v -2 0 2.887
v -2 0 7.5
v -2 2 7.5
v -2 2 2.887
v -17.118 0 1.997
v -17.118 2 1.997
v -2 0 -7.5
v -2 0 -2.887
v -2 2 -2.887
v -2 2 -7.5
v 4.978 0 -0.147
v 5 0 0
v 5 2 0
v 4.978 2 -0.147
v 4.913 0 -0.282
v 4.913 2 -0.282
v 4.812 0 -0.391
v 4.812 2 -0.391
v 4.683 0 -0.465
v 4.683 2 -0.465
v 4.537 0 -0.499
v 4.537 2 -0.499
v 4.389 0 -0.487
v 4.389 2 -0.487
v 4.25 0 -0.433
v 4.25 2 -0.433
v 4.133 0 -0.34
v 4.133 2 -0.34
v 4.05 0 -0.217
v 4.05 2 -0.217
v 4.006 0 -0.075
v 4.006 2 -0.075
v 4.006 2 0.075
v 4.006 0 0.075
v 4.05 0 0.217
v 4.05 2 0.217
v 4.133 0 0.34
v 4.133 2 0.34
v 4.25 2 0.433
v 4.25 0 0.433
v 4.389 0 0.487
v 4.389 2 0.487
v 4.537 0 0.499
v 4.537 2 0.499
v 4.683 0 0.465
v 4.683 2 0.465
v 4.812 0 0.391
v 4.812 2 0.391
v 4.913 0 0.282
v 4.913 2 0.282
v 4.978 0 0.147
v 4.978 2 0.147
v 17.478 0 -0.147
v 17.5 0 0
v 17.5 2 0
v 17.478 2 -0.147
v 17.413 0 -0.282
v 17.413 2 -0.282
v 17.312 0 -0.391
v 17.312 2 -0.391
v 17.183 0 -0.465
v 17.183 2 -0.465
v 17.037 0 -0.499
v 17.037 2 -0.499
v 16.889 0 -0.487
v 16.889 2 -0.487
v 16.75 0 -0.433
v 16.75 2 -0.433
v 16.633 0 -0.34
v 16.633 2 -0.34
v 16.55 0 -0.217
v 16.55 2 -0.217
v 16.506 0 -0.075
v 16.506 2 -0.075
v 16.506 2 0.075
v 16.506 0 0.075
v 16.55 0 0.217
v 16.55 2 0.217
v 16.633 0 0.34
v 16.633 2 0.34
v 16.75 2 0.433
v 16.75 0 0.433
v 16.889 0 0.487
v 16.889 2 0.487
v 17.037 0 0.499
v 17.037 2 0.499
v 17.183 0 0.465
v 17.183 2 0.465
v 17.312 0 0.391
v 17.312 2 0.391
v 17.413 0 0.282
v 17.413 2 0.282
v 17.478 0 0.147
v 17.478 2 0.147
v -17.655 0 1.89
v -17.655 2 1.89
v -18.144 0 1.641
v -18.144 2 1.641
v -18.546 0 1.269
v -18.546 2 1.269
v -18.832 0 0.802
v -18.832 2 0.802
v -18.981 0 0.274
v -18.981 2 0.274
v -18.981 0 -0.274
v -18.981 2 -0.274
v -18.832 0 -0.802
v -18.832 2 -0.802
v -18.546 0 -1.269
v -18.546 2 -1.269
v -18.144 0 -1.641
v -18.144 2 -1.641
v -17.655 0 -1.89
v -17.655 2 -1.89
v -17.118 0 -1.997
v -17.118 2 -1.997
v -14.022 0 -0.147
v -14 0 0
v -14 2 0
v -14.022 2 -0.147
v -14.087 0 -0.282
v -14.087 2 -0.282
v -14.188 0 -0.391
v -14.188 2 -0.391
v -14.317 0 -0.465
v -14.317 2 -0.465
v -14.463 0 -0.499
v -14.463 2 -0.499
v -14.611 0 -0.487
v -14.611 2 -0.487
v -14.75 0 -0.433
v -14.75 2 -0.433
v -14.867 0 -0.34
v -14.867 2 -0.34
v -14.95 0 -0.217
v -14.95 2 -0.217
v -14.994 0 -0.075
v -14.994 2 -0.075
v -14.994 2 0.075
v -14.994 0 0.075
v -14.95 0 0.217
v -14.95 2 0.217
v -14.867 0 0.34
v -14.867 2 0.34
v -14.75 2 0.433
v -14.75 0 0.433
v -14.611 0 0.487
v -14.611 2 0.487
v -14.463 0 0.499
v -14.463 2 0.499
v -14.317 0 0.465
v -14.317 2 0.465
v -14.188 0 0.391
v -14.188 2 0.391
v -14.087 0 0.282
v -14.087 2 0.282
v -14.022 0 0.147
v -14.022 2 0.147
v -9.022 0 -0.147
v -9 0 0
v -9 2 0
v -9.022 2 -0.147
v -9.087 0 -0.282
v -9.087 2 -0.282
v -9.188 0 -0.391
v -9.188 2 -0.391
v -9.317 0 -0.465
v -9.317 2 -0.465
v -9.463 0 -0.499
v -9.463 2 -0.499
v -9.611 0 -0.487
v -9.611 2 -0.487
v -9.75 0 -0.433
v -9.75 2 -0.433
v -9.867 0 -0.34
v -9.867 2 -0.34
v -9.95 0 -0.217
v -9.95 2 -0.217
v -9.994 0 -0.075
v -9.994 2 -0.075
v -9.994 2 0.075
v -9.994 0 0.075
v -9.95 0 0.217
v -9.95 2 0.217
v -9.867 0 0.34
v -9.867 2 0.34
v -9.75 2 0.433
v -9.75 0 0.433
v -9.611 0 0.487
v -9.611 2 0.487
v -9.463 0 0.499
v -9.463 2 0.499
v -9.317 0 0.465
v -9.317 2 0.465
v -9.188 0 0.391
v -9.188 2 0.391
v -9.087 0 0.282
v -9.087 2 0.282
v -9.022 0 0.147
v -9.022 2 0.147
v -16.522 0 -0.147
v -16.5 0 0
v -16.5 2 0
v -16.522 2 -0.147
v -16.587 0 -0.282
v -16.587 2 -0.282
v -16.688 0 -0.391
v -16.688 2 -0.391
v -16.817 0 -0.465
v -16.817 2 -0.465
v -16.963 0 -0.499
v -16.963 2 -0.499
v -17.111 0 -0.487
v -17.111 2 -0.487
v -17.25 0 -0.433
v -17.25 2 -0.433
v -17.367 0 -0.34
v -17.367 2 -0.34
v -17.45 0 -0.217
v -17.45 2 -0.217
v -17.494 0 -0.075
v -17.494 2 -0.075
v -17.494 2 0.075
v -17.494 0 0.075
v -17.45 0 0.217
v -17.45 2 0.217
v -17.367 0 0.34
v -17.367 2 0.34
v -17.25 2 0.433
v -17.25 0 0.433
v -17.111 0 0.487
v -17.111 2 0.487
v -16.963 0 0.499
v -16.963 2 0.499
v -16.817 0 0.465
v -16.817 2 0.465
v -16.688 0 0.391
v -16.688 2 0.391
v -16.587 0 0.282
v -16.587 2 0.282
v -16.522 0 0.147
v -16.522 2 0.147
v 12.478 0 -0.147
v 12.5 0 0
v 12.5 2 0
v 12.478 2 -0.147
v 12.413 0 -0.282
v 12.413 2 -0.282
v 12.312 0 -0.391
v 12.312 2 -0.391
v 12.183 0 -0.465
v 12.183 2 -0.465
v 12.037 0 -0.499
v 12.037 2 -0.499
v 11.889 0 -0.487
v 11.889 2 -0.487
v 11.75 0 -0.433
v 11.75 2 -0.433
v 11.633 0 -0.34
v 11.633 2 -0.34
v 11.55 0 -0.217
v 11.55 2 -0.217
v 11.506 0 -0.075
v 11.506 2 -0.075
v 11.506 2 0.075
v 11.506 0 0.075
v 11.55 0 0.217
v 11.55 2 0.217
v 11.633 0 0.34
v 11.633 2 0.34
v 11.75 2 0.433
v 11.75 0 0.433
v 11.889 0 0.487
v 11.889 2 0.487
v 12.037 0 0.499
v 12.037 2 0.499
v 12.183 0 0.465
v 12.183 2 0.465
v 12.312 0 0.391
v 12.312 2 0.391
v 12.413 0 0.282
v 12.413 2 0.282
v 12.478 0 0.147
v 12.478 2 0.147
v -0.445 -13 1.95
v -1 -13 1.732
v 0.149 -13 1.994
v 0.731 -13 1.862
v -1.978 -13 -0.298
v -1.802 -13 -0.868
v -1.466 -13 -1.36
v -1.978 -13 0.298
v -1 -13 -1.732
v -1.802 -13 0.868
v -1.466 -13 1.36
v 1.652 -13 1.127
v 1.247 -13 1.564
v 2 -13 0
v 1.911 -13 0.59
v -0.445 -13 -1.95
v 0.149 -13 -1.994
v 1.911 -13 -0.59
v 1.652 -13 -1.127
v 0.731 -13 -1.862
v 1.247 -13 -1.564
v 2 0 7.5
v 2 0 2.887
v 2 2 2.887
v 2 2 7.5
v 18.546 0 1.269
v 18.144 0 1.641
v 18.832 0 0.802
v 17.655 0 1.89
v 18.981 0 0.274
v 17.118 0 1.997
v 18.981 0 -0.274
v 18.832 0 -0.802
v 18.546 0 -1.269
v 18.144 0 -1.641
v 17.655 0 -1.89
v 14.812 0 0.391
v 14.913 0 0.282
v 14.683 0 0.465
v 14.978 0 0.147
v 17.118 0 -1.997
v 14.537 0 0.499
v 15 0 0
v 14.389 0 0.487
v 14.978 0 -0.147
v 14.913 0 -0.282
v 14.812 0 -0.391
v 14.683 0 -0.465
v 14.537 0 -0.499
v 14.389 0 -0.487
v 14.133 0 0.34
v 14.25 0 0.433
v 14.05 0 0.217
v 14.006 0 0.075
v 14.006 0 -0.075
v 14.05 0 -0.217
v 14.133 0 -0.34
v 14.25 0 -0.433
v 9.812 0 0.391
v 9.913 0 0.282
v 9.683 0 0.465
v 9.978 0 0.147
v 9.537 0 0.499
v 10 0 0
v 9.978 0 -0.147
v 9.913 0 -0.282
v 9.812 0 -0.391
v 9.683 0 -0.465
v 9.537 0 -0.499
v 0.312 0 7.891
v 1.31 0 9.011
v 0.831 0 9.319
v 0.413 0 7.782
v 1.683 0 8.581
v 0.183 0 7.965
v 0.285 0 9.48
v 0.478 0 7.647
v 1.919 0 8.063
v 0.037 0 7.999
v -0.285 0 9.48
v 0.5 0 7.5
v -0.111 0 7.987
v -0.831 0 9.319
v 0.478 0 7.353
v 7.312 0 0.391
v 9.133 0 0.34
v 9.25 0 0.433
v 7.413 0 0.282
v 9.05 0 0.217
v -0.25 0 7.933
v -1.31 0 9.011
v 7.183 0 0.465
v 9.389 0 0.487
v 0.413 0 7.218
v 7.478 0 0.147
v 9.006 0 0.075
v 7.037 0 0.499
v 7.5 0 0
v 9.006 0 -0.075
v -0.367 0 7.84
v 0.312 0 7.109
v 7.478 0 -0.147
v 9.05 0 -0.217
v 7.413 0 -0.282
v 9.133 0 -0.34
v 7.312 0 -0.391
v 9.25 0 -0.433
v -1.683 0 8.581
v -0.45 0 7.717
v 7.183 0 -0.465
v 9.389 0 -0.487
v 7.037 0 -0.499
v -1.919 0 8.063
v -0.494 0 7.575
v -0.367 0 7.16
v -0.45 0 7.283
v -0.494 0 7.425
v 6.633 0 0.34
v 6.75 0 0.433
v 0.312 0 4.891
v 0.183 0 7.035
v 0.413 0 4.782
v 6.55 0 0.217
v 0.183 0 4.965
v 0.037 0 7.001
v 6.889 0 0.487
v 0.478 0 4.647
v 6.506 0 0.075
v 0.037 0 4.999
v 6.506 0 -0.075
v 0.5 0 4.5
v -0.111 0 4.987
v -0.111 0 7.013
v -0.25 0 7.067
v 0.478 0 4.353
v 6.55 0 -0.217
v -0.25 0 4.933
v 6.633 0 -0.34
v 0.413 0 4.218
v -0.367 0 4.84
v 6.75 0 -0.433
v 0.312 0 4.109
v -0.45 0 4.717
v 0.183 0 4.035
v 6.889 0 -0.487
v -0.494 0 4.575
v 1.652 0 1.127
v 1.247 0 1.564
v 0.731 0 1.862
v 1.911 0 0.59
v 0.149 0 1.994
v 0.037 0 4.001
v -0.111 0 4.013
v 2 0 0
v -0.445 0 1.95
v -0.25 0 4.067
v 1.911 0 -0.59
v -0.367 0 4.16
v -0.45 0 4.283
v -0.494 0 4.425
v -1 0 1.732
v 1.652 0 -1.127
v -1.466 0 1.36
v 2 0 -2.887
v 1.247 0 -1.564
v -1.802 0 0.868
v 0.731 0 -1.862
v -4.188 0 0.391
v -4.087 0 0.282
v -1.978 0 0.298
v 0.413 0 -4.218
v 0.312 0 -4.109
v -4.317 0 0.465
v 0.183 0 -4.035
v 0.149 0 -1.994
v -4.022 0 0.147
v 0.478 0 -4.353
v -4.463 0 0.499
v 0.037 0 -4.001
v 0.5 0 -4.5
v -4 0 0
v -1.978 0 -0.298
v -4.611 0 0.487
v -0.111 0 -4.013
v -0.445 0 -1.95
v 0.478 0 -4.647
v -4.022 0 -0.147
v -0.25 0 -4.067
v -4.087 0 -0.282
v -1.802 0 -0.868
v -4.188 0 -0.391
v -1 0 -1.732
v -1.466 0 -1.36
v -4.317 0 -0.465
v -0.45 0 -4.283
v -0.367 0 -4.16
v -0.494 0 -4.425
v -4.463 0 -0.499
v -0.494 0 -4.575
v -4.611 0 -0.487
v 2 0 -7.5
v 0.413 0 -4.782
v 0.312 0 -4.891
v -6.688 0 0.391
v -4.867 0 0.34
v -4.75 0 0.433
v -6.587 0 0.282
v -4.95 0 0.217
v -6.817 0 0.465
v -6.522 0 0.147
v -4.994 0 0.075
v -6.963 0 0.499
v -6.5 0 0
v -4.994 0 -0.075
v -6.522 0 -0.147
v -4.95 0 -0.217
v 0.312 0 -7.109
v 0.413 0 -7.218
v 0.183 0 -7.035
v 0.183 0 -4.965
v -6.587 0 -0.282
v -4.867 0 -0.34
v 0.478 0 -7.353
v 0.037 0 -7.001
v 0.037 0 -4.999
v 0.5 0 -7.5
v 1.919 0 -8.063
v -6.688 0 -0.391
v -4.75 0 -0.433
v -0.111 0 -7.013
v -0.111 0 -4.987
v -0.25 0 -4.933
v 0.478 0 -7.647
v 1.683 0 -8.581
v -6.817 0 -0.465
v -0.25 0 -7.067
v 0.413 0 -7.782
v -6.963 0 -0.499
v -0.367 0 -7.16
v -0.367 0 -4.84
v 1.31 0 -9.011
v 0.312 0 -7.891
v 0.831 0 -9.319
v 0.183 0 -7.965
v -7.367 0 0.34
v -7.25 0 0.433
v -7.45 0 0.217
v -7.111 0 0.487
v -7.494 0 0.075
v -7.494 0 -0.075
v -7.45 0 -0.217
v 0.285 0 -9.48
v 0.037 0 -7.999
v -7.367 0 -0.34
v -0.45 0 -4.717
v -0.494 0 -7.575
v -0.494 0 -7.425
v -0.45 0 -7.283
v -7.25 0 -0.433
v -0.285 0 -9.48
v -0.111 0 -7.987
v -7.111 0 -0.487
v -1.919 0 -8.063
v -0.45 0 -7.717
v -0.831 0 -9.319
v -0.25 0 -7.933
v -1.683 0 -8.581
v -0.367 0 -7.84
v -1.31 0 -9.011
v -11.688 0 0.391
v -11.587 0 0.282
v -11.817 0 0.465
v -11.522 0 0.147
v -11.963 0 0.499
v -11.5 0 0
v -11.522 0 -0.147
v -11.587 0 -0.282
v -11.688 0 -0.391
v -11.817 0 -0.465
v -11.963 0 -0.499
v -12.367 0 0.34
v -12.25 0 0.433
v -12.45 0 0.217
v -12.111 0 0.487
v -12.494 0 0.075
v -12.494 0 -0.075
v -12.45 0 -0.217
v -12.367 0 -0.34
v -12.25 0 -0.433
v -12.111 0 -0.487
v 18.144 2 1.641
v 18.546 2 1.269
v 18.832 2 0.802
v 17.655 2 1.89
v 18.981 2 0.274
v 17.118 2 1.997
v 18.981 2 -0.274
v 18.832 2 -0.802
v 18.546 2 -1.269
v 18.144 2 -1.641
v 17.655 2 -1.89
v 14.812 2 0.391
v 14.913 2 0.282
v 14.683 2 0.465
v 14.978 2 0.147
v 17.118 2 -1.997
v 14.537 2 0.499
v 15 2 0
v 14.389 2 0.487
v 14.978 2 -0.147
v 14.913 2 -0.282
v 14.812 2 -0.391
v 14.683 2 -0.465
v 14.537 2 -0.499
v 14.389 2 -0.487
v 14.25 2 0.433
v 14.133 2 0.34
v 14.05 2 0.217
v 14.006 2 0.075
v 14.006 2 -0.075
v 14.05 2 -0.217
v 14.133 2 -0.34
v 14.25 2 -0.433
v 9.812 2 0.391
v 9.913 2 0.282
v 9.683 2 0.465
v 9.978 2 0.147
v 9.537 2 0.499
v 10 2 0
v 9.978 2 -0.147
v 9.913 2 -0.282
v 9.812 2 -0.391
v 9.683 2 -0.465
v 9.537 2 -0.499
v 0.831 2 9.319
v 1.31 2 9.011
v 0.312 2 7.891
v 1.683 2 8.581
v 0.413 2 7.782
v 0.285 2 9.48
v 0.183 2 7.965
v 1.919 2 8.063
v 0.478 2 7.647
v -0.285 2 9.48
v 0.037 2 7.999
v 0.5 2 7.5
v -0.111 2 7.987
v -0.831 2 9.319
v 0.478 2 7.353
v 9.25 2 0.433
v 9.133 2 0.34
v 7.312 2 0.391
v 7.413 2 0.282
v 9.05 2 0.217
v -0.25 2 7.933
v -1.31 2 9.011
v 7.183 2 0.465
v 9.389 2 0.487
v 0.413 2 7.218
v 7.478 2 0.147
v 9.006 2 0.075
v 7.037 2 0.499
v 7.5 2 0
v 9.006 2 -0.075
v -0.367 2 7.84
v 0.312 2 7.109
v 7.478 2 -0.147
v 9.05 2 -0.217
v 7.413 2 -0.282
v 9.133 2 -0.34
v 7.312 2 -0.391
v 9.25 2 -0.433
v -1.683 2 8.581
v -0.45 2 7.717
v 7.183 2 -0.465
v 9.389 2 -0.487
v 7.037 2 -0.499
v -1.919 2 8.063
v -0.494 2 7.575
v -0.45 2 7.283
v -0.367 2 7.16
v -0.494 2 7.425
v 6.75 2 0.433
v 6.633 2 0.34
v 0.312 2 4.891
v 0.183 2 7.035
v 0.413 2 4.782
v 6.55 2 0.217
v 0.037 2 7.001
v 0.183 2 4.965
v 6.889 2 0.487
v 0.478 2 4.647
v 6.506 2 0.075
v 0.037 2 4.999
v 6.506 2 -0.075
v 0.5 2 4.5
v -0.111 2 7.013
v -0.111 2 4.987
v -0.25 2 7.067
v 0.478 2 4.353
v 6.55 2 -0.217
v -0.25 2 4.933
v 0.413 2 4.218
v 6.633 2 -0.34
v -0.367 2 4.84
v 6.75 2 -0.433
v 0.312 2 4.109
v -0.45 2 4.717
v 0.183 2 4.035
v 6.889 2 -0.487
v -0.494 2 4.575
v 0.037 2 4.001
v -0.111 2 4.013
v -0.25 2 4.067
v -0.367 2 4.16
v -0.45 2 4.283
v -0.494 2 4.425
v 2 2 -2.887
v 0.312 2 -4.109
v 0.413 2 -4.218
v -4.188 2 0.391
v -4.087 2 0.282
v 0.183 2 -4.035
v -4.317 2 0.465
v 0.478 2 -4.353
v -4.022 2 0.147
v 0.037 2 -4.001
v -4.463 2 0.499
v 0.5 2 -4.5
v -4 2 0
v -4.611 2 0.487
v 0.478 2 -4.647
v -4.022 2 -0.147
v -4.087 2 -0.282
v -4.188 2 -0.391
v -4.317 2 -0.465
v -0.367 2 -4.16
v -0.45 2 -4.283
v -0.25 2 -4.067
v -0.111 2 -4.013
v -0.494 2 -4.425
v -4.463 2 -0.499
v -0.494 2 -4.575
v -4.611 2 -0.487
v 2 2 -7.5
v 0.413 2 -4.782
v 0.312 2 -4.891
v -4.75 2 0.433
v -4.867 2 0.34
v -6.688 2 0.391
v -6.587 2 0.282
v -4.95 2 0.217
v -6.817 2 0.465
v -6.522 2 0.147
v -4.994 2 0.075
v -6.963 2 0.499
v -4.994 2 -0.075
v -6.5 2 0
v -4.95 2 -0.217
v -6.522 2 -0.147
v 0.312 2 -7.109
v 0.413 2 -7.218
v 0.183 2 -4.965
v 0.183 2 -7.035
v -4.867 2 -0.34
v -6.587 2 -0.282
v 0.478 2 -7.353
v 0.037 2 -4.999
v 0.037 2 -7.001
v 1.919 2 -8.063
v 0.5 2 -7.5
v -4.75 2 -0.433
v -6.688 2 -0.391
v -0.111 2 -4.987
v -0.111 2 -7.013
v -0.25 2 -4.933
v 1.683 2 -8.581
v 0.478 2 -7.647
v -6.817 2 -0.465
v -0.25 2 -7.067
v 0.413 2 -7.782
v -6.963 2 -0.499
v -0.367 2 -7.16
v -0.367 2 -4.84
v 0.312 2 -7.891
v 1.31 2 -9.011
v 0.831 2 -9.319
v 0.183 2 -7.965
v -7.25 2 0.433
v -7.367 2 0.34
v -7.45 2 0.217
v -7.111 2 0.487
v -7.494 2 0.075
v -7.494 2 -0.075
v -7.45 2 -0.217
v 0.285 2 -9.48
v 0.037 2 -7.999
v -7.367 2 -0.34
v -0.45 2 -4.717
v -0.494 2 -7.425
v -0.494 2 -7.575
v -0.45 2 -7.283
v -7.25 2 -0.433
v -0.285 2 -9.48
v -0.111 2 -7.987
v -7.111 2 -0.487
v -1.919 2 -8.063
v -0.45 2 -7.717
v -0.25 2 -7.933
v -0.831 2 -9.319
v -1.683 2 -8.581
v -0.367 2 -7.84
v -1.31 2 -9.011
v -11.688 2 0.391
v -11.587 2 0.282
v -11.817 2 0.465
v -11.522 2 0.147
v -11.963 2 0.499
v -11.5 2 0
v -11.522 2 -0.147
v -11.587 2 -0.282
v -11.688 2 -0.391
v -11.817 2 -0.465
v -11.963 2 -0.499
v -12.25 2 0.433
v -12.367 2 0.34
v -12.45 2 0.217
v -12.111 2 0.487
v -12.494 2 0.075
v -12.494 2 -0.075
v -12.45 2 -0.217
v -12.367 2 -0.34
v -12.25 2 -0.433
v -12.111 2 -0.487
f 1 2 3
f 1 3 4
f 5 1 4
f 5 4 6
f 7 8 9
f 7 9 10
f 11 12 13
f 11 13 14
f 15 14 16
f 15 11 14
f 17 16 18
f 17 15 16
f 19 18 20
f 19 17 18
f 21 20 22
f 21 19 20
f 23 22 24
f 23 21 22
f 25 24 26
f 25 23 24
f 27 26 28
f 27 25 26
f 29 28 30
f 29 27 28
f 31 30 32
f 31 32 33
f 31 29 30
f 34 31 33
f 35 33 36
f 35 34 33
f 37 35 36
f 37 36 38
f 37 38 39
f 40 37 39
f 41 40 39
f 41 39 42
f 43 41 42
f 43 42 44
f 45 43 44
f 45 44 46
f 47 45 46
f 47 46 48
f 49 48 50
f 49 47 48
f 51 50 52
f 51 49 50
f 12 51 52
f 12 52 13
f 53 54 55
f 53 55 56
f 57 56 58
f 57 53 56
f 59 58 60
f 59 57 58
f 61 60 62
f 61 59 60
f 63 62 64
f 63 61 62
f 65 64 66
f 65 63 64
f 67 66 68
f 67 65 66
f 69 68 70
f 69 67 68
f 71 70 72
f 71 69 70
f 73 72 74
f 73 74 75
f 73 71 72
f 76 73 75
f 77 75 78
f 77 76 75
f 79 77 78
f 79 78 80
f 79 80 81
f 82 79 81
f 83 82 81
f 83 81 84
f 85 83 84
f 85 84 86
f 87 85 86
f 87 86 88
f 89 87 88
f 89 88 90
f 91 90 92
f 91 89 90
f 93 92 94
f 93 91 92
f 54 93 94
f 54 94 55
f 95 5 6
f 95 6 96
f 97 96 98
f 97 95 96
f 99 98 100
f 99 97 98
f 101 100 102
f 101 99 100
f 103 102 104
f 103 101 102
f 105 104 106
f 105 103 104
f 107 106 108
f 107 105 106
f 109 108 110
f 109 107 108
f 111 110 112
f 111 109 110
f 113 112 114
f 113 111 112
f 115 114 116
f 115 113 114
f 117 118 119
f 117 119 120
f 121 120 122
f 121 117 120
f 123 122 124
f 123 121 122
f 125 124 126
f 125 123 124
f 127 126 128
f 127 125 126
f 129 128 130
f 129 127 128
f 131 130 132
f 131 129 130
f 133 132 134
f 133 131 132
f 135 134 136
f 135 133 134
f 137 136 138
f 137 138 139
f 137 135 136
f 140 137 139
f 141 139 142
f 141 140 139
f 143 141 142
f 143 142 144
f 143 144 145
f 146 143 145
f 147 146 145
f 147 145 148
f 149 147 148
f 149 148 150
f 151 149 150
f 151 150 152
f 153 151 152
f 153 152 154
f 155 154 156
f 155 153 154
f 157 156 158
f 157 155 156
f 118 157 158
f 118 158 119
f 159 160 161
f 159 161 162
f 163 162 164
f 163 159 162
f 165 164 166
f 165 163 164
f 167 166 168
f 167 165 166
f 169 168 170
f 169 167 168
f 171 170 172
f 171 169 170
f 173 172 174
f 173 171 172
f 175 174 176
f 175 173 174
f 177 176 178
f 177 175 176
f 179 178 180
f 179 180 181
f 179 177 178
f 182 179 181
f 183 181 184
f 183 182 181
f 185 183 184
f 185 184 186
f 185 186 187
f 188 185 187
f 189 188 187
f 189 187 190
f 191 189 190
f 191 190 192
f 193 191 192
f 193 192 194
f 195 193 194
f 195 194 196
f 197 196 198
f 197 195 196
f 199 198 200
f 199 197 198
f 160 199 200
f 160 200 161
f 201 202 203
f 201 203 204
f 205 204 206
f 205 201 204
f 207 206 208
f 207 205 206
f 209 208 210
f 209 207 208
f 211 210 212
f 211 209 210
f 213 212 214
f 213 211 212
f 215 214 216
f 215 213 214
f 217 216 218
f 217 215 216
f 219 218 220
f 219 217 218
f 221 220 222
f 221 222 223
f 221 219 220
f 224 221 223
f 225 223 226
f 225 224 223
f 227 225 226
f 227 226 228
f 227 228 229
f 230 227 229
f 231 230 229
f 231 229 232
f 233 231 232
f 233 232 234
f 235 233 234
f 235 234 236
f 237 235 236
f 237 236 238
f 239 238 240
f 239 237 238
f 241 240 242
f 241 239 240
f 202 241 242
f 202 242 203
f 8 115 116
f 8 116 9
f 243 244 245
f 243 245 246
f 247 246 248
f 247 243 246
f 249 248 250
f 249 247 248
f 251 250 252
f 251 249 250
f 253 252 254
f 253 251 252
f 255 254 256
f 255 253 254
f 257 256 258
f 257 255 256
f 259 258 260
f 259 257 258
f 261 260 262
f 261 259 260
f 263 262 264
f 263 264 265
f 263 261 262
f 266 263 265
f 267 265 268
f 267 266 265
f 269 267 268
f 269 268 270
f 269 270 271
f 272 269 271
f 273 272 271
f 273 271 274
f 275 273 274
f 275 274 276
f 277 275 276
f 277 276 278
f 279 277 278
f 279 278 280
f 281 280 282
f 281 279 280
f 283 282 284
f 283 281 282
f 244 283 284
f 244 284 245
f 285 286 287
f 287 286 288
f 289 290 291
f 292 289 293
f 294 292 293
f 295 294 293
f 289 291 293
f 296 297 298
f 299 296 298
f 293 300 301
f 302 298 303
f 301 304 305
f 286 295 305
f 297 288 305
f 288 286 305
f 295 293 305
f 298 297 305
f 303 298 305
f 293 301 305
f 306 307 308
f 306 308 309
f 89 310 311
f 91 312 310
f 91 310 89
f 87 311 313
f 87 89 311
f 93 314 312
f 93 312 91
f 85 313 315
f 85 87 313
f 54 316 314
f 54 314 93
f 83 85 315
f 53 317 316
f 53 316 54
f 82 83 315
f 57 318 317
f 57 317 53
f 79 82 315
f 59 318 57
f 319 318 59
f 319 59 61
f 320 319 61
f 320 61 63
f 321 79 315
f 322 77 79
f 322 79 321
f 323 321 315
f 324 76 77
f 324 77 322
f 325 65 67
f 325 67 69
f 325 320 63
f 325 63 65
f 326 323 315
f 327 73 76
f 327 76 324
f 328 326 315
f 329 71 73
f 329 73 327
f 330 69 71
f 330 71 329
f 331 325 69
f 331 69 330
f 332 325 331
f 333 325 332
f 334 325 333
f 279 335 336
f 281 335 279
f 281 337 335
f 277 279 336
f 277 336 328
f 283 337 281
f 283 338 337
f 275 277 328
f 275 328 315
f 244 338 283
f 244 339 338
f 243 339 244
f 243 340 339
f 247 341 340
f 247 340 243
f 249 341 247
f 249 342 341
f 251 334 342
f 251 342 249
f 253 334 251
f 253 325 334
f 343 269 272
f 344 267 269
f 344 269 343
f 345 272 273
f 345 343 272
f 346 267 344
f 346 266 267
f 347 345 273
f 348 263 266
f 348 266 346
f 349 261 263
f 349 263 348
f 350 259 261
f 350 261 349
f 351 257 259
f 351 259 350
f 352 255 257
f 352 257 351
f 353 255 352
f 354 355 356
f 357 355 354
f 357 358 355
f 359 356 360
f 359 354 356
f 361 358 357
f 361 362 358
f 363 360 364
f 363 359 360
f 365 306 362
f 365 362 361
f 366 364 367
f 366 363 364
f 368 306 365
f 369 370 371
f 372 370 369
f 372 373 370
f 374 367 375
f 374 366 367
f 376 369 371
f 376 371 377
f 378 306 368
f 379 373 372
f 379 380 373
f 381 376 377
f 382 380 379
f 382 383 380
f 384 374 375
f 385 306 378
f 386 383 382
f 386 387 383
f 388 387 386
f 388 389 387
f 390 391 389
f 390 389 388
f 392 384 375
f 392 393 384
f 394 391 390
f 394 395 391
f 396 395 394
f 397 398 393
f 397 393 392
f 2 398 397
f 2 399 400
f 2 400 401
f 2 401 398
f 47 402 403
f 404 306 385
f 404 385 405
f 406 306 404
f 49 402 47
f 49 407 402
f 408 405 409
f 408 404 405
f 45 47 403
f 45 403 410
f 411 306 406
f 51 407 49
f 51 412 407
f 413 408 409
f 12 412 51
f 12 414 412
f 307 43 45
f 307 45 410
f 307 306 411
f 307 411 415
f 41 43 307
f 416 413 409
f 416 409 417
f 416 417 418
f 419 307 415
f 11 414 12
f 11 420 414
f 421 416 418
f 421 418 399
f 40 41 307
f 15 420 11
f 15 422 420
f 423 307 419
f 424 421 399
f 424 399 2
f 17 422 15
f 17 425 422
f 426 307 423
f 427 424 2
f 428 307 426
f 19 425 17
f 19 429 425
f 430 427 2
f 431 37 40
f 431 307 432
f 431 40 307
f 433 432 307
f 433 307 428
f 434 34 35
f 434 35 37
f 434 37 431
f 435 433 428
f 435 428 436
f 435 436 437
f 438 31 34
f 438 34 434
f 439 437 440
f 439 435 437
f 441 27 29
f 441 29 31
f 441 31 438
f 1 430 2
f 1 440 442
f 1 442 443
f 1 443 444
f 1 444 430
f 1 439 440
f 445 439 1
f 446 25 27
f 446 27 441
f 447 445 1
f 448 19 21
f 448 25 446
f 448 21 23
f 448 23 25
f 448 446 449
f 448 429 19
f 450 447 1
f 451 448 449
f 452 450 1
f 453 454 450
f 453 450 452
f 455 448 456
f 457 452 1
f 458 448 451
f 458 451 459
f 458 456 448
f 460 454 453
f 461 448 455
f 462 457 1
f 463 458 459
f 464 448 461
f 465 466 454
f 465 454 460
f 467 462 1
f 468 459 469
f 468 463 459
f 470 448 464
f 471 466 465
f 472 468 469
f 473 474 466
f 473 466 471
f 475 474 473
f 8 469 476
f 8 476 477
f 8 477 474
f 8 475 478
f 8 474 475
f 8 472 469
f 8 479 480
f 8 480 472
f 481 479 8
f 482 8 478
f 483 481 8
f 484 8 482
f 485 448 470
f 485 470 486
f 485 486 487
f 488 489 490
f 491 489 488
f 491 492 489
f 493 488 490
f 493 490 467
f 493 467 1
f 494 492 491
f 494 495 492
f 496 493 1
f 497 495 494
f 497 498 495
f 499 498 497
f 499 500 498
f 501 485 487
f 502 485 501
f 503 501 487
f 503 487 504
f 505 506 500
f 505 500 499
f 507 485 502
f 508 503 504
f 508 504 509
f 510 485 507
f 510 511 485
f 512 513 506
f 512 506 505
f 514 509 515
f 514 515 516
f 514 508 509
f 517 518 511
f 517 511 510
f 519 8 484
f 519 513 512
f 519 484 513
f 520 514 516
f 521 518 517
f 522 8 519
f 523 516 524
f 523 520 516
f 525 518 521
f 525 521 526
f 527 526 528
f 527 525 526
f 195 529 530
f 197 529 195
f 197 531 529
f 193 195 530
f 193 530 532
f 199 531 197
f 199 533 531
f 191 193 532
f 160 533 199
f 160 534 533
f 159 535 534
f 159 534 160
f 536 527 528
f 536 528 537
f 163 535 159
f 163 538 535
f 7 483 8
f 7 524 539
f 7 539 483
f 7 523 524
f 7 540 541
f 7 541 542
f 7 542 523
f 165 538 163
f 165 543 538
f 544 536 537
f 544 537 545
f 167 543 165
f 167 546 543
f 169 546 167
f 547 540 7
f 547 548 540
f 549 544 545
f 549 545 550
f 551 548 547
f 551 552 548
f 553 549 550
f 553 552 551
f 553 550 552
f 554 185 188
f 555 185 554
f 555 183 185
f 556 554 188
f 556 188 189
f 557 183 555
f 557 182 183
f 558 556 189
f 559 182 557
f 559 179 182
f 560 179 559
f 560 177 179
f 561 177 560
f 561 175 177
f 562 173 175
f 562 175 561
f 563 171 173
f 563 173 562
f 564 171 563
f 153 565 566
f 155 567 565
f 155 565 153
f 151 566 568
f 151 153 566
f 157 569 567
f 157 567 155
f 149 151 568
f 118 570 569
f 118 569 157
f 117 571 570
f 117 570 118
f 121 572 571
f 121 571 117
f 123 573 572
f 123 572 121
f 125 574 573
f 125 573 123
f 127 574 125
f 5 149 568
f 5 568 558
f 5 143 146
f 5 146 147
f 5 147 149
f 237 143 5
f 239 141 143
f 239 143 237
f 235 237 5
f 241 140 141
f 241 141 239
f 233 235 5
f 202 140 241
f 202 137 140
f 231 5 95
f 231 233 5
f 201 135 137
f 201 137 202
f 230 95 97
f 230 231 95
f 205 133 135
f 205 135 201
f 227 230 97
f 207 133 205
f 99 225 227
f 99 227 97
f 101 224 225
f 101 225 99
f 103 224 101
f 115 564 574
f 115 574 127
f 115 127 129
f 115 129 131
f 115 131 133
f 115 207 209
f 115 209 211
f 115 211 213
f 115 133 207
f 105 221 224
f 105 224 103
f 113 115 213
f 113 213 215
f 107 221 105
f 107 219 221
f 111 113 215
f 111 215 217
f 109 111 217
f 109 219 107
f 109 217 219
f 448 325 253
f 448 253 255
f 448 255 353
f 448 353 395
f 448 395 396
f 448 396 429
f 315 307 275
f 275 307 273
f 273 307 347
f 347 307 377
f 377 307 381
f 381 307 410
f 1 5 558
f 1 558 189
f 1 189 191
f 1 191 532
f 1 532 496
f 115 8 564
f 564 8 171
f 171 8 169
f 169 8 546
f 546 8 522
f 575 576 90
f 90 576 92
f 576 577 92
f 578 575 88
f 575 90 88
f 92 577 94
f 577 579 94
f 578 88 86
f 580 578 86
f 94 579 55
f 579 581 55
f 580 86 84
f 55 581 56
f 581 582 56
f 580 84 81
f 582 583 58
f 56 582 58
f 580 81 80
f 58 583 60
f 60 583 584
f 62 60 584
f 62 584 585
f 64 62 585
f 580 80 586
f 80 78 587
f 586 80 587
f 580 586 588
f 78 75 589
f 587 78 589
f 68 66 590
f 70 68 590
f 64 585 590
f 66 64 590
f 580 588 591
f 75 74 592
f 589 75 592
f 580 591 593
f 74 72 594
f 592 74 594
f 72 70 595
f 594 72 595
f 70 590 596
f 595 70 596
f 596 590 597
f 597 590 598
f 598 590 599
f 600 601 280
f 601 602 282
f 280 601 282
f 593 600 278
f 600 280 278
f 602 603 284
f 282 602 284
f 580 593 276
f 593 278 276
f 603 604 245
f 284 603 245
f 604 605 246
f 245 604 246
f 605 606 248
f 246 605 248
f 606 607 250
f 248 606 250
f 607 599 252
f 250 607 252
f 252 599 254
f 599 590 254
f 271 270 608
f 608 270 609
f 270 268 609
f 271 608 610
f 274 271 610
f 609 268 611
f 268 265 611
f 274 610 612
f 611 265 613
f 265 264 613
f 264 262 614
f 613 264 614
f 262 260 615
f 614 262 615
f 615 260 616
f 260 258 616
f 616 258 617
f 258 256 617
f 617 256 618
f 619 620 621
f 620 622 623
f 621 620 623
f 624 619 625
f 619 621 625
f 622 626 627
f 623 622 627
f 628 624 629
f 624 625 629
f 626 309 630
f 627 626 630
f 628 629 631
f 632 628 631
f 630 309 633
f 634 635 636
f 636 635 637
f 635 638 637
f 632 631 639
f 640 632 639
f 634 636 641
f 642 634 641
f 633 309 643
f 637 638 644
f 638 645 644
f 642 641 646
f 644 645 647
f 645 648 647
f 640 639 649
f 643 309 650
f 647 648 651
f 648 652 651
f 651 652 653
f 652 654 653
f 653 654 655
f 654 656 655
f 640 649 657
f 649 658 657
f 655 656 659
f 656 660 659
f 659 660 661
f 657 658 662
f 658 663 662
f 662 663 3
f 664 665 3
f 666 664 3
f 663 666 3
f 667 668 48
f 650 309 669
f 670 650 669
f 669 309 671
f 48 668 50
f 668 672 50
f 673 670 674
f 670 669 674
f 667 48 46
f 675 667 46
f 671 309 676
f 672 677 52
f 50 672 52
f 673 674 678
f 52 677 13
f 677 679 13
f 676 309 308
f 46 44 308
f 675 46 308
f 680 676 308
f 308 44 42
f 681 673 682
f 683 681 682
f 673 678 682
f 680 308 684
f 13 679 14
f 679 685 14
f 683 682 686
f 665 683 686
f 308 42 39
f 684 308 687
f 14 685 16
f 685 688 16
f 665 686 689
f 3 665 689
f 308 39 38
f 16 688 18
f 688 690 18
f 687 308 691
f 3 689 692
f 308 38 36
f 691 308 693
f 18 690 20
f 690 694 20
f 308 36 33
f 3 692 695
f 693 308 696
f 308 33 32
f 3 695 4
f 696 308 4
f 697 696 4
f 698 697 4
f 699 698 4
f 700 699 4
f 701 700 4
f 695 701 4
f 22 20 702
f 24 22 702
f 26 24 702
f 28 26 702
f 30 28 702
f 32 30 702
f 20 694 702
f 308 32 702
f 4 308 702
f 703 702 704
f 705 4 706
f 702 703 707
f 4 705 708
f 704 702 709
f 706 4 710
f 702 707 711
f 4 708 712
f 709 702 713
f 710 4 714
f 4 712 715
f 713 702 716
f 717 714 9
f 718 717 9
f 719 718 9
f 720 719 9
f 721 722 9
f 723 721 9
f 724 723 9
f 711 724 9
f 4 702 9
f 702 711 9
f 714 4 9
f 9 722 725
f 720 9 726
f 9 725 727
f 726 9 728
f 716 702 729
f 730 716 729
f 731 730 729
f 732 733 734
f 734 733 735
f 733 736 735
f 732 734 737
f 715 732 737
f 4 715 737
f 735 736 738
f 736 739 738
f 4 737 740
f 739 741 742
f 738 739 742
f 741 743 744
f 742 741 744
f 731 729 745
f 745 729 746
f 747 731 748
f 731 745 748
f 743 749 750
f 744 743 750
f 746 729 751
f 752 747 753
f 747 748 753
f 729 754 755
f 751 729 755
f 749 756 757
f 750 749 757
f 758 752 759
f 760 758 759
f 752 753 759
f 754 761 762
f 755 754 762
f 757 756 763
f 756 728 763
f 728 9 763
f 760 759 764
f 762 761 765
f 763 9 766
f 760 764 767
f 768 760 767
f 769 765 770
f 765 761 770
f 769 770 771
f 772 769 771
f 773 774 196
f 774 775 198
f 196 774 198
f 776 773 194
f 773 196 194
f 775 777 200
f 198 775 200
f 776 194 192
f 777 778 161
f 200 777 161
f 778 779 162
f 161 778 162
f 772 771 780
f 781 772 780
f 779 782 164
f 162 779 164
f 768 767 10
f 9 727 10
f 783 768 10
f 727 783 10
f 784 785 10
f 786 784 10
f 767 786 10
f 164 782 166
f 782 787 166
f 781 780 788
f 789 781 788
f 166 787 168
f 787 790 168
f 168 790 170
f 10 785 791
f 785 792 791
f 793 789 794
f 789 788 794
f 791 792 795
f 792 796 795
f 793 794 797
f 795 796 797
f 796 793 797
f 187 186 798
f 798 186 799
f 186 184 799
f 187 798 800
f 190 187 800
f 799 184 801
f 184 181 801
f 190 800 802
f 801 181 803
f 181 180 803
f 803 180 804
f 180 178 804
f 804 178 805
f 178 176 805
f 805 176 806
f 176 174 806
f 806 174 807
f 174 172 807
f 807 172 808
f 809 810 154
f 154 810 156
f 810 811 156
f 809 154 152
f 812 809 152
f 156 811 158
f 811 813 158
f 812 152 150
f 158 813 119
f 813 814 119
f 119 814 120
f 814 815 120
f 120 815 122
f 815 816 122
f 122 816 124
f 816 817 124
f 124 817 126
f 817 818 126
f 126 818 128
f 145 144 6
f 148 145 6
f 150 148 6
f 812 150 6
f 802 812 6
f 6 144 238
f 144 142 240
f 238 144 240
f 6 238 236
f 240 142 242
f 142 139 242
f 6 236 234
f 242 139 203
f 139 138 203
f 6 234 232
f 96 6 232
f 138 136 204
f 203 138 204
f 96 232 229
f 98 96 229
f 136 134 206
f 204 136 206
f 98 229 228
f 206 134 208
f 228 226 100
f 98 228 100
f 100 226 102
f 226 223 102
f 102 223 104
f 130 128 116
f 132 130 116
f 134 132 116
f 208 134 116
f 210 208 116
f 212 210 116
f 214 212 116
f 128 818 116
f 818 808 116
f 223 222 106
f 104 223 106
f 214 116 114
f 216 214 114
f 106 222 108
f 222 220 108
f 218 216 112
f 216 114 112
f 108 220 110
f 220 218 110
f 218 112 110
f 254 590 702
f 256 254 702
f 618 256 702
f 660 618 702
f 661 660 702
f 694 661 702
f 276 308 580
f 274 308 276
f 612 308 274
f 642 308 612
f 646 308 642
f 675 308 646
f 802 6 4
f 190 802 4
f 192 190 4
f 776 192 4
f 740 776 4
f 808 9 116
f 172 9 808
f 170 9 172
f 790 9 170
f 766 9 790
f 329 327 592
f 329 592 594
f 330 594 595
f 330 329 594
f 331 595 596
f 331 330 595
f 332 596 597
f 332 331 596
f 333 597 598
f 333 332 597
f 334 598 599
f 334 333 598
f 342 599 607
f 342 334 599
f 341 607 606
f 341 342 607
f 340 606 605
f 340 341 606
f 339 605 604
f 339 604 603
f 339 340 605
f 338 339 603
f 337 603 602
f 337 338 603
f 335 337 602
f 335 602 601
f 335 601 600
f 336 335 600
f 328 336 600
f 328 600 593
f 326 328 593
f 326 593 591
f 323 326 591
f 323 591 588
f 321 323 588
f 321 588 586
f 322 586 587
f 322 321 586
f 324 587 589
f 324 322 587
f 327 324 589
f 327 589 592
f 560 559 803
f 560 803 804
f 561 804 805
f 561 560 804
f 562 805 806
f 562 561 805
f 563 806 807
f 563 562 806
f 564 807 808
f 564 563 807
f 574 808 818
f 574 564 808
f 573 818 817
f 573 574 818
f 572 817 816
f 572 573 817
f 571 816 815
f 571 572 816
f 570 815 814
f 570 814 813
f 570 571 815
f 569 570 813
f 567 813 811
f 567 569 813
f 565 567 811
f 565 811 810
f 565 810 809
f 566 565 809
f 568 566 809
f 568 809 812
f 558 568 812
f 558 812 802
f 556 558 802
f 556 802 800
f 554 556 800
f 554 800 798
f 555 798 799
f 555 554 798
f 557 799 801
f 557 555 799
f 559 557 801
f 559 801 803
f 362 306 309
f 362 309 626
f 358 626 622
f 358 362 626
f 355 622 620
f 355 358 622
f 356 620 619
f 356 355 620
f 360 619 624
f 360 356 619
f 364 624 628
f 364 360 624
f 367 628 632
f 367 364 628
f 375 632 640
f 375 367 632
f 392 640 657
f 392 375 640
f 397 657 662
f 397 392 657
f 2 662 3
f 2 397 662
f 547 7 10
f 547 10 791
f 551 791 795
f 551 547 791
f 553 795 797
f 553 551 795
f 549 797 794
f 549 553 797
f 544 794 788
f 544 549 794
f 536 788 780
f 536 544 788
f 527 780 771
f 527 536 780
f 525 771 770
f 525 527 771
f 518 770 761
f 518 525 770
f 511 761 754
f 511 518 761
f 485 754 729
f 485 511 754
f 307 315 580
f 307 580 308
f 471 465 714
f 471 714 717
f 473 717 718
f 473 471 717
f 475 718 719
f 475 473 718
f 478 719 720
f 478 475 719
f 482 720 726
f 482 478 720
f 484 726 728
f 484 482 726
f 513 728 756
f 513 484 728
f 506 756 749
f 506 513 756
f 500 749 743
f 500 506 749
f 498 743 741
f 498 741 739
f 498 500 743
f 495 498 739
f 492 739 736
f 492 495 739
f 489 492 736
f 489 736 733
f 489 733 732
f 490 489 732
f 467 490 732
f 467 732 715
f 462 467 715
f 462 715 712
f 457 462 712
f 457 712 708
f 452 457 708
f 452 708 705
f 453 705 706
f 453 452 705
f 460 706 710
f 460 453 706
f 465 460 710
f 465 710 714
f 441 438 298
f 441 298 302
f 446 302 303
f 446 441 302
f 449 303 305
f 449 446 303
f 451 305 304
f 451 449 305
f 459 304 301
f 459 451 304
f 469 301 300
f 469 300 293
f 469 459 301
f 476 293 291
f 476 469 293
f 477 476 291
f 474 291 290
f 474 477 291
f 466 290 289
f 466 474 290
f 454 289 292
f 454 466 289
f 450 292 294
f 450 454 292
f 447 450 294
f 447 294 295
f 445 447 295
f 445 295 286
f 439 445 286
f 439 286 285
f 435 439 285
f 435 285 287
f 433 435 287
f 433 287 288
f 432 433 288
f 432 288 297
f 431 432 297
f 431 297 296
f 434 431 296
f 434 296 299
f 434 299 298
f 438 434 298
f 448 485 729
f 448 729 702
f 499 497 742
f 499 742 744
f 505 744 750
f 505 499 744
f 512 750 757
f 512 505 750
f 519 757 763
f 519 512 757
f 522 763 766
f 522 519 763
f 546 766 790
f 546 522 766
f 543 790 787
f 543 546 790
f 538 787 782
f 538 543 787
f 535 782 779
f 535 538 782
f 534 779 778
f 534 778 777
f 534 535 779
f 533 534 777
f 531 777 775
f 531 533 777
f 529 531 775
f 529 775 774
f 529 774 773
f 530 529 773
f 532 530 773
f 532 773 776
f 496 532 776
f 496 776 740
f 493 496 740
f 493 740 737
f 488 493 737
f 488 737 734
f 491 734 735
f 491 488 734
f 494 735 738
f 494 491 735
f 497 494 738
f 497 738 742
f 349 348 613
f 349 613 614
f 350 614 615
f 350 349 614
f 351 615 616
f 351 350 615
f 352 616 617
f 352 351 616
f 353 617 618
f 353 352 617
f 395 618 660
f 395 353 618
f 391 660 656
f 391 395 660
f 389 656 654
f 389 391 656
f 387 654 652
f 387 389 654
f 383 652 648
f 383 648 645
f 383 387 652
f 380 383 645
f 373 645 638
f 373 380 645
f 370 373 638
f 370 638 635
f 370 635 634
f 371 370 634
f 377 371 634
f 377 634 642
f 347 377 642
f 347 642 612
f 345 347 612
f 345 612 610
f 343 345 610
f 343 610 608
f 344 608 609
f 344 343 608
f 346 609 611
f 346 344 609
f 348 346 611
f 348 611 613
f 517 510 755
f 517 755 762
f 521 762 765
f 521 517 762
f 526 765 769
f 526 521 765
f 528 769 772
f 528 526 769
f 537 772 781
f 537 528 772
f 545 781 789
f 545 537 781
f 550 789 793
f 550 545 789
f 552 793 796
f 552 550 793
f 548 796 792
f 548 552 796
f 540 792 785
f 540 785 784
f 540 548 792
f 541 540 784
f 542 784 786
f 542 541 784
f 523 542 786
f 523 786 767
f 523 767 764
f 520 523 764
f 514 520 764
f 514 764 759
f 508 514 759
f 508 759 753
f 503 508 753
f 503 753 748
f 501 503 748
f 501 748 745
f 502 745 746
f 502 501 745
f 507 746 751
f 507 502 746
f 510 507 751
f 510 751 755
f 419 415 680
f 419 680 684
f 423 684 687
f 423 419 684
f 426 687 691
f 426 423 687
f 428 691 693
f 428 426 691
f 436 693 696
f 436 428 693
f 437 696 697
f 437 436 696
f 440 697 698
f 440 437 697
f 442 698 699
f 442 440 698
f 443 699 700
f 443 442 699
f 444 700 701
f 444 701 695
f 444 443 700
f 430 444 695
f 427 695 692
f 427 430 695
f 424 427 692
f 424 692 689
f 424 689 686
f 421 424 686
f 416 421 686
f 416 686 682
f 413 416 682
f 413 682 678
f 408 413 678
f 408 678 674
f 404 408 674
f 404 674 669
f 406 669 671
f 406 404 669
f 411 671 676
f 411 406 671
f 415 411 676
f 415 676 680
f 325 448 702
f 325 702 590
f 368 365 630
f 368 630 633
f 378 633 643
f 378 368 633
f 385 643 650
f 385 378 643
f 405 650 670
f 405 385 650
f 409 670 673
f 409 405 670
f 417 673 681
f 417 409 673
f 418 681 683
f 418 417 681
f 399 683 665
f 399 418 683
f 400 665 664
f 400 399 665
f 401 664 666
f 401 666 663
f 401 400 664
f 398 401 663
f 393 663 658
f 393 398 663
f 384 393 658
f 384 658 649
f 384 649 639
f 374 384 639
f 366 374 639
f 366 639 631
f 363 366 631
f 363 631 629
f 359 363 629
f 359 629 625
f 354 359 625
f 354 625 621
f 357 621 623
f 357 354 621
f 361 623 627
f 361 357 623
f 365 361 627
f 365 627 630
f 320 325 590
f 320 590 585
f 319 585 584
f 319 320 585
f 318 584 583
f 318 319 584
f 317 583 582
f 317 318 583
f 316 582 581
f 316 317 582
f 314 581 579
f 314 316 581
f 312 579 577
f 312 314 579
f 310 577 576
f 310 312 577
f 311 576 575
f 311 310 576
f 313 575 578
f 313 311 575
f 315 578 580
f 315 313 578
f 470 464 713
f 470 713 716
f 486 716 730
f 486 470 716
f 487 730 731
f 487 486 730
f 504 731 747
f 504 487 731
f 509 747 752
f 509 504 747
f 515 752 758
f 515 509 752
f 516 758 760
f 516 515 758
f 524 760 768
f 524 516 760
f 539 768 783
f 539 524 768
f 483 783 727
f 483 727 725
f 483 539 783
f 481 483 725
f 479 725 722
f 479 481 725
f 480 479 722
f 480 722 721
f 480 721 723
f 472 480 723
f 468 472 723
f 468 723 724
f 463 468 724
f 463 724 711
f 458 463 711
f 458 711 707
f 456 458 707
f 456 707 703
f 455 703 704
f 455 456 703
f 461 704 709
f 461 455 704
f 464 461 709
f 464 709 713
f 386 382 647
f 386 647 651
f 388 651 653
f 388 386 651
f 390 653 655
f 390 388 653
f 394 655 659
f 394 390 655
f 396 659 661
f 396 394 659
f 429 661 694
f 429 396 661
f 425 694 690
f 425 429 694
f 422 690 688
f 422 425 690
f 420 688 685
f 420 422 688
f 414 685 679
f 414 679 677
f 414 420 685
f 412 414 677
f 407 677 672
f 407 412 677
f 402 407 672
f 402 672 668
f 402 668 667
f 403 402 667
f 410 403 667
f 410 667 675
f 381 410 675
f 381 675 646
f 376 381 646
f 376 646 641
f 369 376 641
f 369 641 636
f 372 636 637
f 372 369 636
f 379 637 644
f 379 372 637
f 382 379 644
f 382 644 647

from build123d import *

# Parameters (mm, degrees)
SKETCH1_R           = 2
SKETCH1_R_2         = 0.5
BOSS_EXTRUDE1_DEPTH = 2
BOSS_EXTRUDE2_START = 2
SKETCH1_3_R         = 2
BOSS_EXTRUDE2_DEPTH = 15


with BuildPart() as part:
    # Sketch1 → Boss-Extrude1 (new body)
    with BuildSketch(Plane(origin=(0, 0, 0), x_dir=(1, 0, 0), z_dir=(0, 1, 0))):
        with BuildLine():
            Line((2, 7.5), (2, 2.88735269))
            Line((2, 2.88735269), (17.117647059, 1.996536794))
            ThreePointArc((17.117647059, 1.996536794), (19, 0), (17.117647059, -1.996536794))
            Line((17.117647059, -1.996536794), (2, -2.88735269))
            Line((2, -2.88735269), (2, -7.5))
            ThreePointArc((2, -7.5), (0, -9.5), (-2, -7.5))
            Line((-2, -7.5), (-2, -2.88735269))
            Line((-2, -2.88735269), (-17.117647059, -1.996536794))
            ThreePointArc((-17.117647059, -1.996536794), (-19, 0), (-17.117647059, 1.996536794))
            Line((-17.117647059, 1.996536794), (-2, 2.88735269))
            Line((-2, 2.88735269), (-2, 7.5))
            ThreePointArc((-2, 7.5), (0, 9.5), (2, 7.5))
        make_face()
        Circle(SKETCH1_R, mode=Mode.SUBTRACT)
        with Locations((-17, 0)):
            Circle(SKETCH1_R_2, mode=Mode.SUBTRACT)
        with Locations((17, 0)):
            Circle(SKETCH1_R_2, mode=Mode.SUBTRACT)
        with Locations((-14.5, 0)):
            Circle(SKETCH1_R_2, mode=Mode.SUBTRACT)
        with Locations((-12, 0)):
            Circle(SKETCH1_R_2, mode=Mode.SUBTRACT)
        with Locations((-9.5, 0)):
            Circle(SKETCH1_R_2, mode=Mode.SUBTRACT)
        with Locations((-7, 0)):
            Circle(SKETCH1_R_2, mode=Mode.SUBTRACT)
        with Locations((-4.5, 0)):
            Circle(SKETCH1_R_2, mode=Mode.SUBTRACT)
        with Locations((4.5, 0)):
            Circle(SKETCH1_R_2, mode=Mode.SUBTRACT)
        with Locations((7, 0)):
            Circle(SKETCH1_R_2, mode=Mode.SUBTRACT)
        with Locations((9.5, 0)):
            Circle(SKETCH1_R_2, mode=Mode.SUBTRACT)
        with Locations((12, 0)):
            Circle(SKETCH1_R_2, mode=Mode.SUBTRACT)
        with Locations((14.5, 0)):
            Circle(SKETCH1_R_2, mode=Mode.SUBTRACT)
        with Locations((0, 7.5)):
            Circle(SKETCH1_R_2, mode=Mode.SUBTRACT)
        with Locations((0, 4.5)):
            Circle(SKETCH1_R_2, mode=Mode.SUBTRACT)
        with Locations((0, -4.5)):
            Circle(SKETCH1_R_2, mode=Mode.SUBTRACT)
        with Locations((0, -7.5)):
            Circle(SKETCH1_R_2, mode=Mode.SUBTRACT)
    extrude(amount=BOSS_EXTRUDE1_DEPTH)

    # Sketch1<3> → Boss-Extrude2 (add)
    with BuildSketch(Plane(origin=(0, 0, 0), x_dir=(1, 0, 0), z_dir=(0, 1, 0)).offset(BOSS_EXTRUDE2_START)):
        Circle(SKETCH1_3_R)
    extrude(amount=-BOSS_EXTRUDE2_DEPTH)


solid = part.part
